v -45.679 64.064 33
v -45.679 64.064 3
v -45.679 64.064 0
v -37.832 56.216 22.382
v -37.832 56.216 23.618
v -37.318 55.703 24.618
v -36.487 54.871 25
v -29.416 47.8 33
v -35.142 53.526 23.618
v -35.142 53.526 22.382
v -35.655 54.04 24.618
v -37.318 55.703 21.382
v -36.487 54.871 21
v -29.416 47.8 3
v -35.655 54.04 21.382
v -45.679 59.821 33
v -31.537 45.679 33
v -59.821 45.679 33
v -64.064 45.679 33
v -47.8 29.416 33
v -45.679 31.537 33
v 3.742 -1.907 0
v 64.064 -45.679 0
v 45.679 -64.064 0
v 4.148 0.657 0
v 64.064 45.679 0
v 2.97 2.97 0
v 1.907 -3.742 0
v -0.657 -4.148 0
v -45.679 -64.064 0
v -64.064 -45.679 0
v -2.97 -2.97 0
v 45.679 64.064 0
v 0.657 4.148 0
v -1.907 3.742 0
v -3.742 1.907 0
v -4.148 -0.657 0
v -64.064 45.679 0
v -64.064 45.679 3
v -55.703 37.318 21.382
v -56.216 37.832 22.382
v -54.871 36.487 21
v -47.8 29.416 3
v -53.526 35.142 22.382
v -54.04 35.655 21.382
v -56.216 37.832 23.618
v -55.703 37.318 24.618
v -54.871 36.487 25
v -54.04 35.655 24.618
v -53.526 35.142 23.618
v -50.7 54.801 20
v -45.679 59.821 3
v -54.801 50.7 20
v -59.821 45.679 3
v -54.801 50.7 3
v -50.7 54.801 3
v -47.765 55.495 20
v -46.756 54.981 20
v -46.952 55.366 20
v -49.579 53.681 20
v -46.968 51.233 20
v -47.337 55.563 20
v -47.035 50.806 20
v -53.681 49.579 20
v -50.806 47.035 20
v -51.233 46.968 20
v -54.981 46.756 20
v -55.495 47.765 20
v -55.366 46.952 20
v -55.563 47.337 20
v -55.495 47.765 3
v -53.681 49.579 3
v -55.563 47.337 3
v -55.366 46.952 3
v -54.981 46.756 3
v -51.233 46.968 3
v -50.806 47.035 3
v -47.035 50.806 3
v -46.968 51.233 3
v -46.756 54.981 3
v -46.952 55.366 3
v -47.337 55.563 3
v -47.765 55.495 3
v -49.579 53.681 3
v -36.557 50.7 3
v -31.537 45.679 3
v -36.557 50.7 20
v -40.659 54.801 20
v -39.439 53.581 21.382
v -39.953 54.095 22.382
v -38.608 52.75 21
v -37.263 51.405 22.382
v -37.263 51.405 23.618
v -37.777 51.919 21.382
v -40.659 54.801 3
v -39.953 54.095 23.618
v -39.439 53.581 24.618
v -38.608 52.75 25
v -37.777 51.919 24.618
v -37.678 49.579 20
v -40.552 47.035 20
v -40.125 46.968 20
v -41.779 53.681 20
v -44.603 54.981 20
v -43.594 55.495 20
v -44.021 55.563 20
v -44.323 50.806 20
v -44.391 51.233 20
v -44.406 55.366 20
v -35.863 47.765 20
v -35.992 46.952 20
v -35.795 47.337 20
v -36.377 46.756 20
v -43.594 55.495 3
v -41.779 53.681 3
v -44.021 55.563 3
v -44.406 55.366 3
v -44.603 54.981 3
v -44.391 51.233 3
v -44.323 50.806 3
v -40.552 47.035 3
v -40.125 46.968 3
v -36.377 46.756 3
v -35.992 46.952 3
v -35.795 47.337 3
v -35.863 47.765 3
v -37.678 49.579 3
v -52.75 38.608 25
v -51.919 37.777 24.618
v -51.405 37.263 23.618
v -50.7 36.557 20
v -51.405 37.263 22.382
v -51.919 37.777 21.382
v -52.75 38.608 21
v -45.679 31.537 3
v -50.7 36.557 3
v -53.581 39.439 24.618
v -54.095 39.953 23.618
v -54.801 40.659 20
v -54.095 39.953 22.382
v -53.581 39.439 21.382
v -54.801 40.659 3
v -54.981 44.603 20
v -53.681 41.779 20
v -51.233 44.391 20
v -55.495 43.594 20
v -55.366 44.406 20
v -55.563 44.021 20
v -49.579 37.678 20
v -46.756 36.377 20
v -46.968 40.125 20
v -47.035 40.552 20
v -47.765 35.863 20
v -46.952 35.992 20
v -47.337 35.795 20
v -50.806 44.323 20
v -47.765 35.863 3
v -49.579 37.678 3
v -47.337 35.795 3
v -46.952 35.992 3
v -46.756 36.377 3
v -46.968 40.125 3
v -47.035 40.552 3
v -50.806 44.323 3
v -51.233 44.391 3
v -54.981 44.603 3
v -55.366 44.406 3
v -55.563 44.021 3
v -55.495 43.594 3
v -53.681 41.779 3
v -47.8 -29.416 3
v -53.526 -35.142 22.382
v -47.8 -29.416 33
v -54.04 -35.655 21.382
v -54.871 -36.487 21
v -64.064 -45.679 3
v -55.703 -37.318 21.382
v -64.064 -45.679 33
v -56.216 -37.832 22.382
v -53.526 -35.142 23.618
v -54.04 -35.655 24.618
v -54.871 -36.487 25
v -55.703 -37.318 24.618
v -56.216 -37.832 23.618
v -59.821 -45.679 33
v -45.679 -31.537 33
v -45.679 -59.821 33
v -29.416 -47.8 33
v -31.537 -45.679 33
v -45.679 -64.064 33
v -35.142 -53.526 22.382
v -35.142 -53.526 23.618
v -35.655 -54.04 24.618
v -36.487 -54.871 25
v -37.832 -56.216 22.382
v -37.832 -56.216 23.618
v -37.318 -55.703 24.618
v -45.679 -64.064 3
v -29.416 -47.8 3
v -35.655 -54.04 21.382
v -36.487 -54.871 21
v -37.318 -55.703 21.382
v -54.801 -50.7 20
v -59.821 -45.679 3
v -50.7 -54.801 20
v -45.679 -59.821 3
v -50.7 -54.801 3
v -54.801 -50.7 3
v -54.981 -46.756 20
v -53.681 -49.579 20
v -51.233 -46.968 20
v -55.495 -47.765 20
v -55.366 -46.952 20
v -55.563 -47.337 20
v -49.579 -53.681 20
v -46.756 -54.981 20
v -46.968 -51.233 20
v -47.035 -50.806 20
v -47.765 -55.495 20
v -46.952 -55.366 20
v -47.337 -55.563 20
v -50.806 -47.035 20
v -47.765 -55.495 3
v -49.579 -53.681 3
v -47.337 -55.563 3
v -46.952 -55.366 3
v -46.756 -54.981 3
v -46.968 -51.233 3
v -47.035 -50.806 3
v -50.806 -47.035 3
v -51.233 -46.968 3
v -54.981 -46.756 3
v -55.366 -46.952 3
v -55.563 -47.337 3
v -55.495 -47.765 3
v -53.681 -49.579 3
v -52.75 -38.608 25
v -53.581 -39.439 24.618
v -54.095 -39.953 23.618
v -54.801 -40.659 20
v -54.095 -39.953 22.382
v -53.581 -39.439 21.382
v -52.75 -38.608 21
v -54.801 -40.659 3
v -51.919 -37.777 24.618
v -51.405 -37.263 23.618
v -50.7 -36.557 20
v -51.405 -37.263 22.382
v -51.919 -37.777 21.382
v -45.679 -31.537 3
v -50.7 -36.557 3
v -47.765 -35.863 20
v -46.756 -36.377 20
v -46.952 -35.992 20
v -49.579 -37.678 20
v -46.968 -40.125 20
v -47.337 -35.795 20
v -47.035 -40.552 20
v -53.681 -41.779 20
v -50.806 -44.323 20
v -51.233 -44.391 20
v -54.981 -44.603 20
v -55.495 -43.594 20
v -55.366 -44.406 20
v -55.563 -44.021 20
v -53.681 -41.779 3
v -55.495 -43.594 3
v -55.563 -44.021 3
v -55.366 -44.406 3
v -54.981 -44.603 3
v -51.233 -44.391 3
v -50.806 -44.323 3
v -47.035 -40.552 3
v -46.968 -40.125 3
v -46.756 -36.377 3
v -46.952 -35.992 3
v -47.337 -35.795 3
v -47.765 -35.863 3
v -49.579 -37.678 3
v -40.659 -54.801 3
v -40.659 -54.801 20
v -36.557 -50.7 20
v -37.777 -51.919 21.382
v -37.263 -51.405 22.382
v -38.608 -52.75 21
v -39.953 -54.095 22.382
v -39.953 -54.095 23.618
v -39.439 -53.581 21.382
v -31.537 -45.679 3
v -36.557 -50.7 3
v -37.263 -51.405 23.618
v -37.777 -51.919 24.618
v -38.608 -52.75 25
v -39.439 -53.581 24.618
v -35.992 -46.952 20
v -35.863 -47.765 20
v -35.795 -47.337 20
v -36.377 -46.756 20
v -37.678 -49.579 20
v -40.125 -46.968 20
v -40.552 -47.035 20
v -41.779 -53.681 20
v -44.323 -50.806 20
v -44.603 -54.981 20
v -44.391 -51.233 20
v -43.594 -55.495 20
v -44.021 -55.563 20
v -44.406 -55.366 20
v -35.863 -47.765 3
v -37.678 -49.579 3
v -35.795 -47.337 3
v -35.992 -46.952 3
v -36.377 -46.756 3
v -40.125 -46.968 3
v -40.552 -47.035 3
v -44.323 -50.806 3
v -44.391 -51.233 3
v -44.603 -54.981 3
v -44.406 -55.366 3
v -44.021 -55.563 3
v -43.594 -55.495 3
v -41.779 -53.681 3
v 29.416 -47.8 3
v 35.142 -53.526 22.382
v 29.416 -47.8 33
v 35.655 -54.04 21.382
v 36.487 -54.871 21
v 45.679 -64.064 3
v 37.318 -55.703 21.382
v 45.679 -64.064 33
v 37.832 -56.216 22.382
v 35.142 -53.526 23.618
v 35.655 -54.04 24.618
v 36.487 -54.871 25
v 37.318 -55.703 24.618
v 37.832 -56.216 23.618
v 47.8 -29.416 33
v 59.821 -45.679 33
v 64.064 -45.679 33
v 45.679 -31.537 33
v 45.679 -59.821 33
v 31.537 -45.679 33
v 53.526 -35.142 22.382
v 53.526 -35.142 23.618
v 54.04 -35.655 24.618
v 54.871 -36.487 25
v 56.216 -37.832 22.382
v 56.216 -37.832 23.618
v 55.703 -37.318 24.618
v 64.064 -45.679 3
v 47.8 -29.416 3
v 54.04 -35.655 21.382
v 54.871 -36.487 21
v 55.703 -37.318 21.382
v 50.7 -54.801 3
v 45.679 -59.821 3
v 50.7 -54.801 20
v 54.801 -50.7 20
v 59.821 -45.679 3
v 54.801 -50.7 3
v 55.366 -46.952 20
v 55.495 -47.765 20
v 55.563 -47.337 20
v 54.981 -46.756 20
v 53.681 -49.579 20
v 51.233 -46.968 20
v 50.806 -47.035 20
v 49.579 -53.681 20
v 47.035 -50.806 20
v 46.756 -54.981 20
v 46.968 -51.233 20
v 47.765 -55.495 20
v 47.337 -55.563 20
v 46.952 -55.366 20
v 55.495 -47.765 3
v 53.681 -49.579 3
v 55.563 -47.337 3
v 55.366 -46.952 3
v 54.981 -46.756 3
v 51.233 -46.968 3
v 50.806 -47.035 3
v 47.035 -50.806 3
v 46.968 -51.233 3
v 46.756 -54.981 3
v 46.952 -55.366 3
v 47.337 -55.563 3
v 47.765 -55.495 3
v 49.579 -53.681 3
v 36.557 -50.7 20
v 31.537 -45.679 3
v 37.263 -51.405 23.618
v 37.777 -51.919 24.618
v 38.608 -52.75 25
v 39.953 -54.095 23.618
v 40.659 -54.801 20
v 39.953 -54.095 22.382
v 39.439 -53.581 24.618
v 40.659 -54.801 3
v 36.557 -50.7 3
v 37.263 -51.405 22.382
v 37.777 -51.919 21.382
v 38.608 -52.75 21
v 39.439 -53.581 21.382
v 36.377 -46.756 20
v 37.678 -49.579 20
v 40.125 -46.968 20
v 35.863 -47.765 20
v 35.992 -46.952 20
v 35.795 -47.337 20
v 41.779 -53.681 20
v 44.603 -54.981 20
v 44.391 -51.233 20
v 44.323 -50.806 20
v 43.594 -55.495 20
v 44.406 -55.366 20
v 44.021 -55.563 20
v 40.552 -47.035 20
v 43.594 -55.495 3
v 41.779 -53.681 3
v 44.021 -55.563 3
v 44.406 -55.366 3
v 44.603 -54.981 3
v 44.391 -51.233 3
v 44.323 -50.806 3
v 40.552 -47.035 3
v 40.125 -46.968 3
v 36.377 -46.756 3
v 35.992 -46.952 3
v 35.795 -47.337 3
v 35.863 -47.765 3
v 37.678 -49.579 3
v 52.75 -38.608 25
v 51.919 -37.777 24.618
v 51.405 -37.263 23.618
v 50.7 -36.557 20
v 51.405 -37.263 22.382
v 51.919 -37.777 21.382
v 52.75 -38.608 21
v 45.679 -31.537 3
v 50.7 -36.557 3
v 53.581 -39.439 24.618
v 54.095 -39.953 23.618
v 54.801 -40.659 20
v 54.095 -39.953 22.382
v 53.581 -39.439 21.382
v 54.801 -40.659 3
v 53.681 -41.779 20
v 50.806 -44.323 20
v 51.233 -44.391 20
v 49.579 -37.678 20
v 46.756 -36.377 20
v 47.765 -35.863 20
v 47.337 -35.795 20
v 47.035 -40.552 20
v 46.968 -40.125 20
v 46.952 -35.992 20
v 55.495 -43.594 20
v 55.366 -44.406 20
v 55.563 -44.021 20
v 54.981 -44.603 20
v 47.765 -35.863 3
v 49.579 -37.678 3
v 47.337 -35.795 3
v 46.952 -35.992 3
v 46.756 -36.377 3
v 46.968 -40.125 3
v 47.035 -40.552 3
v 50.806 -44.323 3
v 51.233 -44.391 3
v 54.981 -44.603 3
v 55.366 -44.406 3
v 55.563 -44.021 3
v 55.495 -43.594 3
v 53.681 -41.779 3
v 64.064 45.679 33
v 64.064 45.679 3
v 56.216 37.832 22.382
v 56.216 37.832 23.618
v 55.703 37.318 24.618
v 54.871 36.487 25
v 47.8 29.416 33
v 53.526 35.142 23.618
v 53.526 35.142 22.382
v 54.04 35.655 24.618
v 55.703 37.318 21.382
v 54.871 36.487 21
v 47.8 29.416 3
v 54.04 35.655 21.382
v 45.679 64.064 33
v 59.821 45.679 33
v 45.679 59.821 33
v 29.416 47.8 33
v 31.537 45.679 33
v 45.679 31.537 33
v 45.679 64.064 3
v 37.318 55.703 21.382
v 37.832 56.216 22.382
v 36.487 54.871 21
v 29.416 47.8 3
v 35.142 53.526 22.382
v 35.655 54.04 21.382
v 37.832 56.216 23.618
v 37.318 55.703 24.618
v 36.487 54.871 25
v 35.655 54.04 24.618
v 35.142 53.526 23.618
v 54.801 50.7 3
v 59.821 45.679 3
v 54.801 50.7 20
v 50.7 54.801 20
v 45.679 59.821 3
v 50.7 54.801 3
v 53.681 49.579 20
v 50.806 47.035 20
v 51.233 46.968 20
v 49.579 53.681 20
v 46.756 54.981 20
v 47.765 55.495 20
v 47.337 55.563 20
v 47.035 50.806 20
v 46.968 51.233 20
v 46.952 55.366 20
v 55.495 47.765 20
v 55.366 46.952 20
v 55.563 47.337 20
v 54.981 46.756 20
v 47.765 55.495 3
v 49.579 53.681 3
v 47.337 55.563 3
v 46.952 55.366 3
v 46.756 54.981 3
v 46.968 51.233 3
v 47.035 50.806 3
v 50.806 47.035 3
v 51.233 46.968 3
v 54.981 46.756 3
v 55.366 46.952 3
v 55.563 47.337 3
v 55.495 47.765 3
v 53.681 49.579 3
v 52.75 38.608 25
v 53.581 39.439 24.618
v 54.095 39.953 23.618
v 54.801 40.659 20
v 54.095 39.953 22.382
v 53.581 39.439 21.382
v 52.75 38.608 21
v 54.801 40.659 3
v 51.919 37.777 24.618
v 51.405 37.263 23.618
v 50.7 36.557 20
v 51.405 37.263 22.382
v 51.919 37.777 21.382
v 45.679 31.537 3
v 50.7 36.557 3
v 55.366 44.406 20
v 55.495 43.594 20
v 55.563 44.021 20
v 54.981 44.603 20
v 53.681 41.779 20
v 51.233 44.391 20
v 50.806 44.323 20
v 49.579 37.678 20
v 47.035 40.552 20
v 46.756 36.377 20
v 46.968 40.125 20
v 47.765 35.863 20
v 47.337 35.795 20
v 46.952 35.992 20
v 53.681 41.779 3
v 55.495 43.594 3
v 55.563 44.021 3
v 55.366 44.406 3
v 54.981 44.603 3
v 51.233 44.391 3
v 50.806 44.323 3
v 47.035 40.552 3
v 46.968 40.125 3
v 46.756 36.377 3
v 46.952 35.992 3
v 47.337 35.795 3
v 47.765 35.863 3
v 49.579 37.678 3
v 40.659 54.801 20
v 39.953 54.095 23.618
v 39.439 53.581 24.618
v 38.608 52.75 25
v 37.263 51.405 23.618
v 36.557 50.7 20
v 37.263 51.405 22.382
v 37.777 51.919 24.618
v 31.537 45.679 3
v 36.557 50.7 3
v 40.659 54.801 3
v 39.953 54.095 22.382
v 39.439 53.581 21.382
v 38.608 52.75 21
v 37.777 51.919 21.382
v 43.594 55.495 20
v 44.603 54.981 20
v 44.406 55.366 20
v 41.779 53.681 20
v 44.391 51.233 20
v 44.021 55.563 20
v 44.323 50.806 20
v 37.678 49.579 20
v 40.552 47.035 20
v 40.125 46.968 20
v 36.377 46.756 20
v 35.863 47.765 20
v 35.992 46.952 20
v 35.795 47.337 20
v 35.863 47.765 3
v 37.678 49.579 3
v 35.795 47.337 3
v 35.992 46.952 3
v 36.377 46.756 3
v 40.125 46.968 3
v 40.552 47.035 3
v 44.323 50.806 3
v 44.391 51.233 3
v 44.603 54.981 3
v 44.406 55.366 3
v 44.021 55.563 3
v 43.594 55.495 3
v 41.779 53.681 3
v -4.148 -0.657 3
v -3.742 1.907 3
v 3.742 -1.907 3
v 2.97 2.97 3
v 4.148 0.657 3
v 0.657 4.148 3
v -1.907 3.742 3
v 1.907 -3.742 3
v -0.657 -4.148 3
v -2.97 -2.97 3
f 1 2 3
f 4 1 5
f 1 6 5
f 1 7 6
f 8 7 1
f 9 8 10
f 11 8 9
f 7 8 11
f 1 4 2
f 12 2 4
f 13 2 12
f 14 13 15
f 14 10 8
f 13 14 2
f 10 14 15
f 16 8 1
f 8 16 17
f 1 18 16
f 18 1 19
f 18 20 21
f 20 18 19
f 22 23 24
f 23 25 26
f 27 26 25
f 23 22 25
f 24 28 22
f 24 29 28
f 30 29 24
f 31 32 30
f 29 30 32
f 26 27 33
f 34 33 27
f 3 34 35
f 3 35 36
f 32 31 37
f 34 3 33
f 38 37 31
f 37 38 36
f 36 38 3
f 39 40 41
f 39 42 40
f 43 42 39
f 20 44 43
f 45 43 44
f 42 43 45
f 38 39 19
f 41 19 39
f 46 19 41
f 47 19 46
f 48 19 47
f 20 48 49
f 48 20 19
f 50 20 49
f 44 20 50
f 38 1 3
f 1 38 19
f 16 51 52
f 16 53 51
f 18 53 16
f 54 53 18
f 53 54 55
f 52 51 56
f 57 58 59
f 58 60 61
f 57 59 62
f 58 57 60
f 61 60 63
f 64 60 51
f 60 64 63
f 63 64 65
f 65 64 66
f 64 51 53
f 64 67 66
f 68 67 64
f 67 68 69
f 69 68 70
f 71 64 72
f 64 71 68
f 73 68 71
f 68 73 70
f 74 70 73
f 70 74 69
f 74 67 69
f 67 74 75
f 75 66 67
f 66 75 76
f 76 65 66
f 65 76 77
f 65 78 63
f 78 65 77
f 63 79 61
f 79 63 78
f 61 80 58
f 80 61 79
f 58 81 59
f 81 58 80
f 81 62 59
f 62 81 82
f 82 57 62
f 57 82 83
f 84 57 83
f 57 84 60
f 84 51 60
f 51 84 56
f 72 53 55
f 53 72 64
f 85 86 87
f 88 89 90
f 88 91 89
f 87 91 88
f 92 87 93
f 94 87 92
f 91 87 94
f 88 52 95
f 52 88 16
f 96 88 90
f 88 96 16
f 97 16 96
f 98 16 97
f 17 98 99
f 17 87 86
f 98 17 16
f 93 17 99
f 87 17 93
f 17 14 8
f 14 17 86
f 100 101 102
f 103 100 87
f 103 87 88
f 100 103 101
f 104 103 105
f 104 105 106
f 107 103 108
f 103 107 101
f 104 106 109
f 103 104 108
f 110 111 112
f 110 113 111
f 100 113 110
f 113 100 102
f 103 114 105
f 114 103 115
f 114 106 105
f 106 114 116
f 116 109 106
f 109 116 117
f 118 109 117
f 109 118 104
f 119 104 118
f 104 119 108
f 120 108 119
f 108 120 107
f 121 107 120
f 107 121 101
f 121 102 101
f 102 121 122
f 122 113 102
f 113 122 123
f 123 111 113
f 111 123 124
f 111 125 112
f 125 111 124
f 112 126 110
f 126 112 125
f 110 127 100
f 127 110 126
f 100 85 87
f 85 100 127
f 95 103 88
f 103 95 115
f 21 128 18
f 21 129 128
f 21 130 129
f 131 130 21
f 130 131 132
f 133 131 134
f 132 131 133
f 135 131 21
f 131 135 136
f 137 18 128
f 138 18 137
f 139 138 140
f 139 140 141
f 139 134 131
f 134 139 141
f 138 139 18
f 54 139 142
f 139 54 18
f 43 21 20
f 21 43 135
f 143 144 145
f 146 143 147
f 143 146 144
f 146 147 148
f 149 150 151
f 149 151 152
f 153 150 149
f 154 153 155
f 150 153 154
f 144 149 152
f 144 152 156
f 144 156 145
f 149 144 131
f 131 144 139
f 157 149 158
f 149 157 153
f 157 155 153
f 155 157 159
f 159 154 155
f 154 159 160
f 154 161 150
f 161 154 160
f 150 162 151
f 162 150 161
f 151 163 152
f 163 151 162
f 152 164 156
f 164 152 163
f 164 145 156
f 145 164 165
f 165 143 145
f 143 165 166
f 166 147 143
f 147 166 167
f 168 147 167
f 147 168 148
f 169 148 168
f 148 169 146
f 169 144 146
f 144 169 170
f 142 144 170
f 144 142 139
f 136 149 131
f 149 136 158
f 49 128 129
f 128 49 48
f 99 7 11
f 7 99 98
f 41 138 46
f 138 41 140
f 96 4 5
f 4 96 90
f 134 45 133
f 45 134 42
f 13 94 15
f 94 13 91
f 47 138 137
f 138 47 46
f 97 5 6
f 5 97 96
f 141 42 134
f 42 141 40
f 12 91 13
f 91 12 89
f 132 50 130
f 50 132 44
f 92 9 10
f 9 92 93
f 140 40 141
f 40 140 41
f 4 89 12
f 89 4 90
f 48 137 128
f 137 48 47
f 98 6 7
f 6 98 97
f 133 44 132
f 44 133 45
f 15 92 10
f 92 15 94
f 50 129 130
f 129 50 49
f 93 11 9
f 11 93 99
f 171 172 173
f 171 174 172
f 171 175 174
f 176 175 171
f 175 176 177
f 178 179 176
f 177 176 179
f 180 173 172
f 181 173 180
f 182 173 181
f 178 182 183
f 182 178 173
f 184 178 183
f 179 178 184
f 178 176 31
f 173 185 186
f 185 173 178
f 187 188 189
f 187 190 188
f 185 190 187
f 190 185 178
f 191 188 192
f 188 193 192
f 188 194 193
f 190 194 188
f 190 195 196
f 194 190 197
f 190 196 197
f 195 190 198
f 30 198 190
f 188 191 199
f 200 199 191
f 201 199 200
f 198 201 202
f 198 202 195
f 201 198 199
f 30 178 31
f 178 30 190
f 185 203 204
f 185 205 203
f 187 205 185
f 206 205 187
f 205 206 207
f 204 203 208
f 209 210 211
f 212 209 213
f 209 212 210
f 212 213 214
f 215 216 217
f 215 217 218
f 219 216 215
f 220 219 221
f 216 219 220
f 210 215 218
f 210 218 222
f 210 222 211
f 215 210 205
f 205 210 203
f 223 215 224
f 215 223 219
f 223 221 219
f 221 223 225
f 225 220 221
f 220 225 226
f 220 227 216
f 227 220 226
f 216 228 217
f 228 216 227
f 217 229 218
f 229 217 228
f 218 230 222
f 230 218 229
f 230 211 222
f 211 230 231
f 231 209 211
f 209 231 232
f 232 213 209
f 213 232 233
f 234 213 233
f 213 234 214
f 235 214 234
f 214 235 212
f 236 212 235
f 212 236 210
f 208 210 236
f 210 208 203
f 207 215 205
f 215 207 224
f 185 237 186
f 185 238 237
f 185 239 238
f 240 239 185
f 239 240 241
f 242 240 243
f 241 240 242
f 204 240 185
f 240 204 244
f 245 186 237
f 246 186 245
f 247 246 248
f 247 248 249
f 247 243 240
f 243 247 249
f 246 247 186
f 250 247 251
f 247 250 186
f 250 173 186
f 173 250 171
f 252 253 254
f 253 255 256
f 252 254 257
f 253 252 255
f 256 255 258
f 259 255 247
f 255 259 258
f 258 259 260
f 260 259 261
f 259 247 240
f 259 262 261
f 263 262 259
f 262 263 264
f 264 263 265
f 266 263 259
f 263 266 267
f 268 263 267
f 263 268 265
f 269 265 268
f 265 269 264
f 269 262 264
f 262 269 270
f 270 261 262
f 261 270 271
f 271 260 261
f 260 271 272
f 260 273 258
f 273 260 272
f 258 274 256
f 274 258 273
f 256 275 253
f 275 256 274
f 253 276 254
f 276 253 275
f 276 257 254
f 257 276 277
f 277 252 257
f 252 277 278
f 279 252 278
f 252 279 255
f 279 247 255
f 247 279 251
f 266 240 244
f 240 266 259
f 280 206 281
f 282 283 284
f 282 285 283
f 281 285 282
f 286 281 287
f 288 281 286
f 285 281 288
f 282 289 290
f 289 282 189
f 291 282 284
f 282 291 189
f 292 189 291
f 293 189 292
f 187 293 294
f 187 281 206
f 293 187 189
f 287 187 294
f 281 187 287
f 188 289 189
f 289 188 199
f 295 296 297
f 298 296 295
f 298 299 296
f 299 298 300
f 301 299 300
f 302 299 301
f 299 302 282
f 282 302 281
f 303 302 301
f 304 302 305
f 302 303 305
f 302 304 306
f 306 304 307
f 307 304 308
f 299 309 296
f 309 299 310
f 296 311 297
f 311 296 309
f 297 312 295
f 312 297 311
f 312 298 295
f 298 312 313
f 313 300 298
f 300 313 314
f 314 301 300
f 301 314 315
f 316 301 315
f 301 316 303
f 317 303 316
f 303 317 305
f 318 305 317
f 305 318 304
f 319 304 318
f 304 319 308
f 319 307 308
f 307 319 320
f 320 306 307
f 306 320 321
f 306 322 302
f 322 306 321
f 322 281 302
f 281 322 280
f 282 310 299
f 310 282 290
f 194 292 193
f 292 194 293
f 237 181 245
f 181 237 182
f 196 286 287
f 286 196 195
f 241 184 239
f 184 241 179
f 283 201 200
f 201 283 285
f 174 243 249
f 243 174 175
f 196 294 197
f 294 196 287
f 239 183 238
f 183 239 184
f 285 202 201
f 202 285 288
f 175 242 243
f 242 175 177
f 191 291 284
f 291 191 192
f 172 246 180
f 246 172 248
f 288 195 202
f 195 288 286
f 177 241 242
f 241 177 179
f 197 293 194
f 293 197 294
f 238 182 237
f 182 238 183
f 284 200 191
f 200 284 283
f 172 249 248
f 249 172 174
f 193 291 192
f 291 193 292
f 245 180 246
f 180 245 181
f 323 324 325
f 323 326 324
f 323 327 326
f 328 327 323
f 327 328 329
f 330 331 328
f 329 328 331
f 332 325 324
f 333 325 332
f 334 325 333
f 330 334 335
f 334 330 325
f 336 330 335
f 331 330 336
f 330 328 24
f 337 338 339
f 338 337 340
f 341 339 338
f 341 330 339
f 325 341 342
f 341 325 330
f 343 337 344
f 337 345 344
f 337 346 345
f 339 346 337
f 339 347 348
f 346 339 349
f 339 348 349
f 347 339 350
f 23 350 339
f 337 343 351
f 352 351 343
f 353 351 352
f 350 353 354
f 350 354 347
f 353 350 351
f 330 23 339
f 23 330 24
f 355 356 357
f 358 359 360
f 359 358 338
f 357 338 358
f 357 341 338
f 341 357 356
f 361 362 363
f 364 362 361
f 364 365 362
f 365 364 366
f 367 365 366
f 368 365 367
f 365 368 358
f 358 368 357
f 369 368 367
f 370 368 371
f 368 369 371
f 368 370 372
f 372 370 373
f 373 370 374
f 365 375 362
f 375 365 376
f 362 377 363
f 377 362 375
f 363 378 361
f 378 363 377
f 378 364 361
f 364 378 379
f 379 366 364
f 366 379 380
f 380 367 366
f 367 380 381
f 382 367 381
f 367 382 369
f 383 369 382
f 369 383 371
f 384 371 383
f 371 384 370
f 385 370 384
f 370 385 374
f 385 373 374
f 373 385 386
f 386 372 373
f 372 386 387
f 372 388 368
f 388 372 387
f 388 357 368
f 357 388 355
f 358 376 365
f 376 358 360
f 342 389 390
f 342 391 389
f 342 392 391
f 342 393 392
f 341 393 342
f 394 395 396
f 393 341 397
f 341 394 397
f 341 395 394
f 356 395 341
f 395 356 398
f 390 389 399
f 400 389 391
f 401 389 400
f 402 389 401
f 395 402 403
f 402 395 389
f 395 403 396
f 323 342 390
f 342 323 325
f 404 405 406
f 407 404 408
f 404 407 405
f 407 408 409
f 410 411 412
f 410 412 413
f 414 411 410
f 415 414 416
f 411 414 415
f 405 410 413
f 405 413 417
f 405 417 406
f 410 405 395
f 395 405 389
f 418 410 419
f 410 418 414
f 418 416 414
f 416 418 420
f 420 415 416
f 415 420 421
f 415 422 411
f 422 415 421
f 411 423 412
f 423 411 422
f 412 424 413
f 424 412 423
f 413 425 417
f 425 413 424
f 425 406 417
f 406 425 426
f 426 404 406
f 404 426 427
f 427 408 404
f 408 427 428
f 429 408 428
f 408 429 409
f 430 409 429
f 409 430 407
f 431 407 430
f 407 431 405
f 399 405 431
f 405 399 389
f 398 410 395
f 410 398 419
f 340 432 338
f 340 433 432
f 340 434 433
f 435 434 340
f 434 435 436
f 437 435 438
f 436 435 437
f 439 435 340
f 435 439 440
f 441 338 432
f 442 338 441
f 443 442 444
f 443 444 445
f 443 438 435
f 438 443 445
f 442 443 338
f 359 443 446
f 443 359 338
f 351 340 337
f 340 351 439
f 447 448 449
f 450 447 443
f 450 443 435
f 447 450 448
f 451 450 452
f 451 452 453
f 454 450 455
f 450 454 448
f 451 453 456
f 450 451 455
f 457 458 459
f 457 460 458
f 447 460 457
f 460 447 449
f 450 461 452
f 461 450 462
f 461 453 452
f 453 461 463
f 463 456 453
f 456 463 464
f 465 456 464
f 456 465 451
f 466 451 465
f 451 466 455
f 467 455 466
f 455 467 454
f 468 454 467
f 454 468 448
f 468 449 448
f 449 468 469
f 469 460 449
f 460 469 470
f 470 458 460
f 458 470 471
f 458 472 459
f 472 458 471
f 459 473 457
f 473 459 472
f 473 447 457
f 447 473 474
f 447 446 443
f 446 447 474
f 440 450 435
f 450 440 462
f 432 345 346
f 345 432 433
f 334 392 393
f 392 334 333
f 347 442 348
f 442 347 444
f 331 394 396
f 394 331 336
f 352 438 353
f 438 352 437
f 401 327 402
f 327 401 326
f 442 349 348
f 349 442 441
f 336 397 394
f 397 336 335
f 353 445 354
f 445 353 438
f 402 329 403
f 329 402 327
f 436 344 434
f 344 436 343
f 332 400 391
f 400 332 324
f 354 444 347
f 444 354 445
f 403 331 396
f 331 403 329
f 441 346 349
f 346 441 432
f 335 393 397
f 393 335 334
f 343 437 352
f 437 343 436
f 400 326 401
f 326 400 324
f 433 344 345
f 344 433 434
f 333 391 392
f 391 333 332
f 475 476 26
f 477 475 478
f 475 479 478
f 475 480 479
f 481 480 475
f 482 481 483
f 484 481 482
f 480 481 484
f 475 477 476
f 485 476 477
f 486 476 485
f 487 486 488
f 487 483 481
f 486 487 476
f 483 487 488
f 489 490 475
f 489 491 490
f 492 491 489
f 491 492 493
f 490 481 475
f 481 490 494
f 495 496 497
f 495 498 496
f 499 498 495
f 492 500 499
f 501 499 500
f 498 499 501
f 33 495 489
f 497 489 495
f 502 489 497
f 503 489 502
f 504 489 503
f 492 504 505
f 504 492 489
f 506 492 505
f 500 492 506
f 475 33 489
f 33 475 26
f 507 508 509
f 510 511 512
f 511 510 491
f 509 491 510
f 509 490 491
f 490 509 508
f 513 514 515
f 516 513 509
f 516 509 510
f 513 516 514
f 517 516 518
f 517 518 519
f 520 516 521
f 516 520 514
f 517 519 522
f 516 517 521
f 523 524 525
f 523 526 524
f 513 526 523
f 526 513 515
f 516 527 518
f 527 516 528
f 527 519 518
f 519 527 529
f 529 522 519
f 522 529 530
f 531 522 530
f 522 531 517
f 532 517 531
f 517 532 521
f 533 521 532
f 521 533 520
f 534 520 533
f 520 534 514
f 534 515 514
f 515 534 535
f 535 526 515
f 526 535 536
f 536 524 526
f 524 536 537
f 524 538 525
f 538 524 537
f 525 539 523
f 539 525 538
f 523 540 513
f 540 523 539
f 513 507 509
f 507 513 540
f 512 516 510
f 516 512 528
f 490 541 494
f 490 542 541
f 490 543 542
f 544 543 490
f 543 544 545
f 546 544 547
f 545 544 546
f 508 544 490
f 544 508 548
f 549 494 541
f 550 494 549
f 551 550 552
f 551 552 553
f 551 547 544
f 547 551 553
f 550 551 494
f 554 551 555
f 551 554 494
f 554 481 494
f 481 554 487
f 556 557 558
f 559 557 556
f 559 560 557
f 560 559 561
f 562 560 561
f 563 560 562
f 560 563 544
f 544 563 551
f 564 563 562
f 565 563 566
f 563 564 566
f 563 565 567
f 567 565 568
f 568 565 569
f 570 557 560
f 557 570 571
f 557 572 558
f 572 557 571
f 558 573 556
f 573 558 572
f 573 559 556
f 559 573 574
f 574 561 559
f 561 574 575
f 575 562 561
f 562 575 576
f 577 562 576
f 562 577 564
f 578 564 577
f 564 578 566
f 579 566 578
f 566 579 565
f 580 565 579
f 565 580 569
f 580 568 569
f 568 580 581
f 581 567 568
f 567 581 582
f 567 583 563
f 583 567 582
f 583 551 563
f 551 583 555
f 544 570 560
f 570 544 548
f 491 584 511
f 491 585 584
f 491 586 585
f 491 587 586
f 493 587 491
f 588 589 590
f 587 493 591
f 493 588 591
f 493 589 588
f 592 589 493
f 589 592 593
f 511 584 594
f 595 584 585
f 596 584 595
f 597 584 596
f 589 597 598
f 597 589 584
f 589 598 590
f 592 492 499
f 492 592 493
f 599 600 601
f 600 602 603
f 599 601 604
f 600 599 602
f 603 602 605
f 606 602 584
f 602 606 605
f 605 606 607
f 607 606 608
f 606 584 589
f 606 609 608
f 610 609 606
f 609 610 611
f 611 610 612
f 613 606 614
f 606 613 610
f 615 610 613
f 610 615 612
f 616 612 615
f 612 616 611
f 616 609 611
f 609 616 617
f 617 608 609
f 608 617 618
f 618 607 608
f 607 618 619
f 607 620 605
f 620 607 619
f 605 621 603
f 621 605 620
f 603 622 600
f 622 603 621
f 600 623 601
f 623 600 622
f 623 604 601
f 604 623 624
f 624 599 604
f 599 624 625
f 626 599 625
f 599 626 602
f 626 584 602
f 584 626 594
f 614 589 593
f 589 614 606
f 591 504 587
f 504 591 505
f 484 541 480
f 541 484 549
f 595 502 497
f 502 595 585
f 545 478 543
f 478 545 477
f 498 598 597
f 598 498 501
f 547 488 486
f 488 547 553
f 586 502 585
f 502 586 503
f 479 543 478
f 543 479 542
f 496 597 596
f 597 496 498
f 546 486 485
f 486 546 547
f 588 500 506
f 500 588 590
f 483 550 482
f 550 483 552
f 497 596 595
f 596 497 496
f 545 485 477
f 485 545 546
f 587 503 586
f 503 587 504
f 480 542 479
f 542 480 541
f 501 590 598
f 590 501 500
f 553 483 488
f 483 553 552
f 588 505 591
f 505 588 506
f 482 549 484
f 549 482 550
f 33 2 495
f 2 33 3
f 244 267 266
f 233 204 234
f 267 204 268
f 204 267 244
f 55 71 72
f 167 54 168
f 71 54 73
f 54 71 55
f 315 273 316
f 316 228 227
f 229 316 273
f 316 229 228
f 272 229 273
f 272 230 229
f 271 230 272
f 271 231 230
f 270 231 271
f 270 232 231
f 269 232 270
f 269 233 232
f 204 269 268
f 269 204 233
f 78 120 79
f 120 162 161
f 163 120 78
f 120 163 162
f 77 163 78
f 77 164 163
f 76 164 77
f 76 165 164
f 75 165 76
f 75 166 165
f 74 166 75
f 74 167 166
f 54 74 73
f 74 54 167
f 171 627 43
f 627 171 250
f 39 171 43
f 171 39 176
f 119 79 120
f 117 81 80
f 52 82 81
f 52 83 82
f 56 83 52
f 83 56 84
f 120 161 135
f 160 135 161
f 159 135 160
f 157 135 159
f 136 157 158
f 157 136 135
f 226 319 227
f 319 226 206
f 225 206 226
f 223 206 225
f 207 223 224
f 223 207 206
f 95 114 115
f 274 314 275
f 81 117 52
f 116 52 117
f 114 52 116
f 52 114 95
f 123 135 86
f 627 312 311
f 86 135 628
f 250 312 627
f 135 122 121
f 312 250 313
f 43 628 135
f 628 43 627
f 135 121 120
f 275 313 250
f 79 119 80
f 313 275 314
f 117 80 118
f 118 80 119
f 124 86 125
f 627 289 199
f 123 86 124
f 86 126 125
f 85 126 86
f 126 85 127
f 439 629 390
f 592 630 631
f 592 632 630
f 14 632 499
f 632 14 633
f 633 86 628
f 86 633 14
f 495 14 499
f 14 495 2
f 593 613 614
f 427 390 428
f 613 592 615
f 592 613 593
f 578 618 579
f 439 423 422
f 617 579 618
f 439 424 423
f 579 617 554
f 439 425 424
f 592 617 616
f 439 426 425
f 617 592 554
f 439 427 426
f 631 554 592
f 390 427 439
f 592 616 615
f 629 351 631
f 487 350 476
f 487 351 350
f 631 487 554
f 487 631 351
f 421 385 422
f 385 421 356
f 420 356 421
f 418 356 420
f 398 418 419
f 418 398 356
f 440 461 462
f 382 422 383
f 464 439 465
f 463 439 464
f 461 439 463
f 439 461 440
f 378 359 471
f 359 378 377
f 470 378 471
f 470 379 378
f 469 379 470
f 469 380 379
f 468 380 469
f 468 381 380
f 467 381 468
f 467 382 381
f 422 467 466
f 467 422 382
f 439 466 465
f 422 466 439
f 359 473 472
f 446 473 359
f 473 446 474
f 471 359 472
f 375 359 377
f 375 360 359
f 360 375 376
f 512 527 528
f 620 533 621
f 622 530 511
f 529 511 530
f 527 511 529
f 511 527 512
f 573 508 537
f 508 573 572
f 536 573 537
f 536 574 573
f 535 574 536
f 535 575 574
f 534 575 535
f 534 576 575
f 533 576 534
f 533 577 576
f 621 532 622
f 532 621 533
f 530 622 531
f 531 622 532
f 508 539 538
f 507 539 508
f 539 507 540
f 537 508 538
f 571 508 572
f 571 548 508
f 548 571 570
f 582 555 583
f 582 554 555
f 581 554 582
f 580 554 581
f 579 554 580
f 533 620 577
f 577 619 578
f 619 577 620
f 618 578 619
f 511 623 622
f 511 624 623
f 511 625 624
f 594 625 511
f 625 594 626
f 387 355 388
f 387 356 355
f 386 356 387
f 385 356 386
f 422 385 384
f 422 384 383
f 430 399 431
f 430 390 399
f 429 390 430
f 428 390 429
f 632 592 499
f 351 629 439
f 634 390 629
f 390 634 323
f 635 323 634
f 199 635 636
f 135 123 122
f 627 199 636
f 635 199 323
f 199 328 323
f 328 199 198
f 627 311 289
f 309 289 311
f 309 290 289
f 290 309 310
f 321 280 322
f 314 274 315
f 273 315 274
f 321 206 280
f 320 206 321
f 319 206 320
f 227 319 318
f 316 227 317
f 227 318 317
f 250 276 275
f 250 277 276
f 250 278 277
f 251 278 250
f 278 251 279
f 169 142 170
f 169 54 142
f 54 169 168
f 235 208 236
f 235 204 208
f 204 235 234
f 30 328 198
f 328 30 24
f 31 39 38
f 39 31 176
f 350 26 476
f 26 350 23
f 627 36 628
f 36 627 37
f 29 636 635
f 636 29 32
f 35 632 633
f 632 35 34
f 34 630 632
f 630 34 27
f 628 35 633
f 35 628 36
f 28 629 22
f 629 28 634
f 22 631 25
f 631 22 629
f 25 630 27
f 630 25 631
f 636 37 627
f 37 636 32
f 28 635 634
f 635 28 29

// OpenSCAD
largeurSupport = 26;
taillePlatine = 155.2;
hauteurSupport = 33;
$fn = 10;

rotate(45) union() {
	for (i = [0 : 3]) {
		rotate([0, 0, i * 90]) {
			translate([0, 54.6,0]) support();
		}
	}
	difference() {
		platine();
		cylinder(h = 20, r = 4.2, center = true);
	}
}

module support() {
	difference() {
		union() {
			translate([-13, 20, 0]) cube([26, 3, hauteurSupport]);
			translate([0, 20, 0]) rotate(180) fleche();
			translate([10, 0, 0]) cube([3, 23, hauteurSupport]);
			translate([10, 10, 0]) rotate(90) fleche();
			translate([-13, 0, 0]) cube([3, 23, hauteurSupport]);
			translate([-10, 10, 0]) rotate(-90) fleche();
		}
	translate ([0, 10, 23 ]) rotate([0, 90, 0]) cylinder(h = 50, r = 2, center = true);
	}
}

module fleche() {
	linear_extrude(height = 20, center = false, convexity = 10, twist = 0)
	union() {
		translate([-2.9, 0, 0]) square([5.8, 5]);
		hull() {
			translate([5.25, 2.25, 0]) circle(0.7, true);
			translate([-5.25, 2.25, 0]) circle(0.7, true);
			translate([-2.45, 4.75, 0]) circle(0.7, true);
			translate([2.45, 4.75, 0]) circle(0.7, true);
		}
	}
}

module platine() {
	linear_extrude(height = 3, center = false, convexity = 10, twist = 0)
	polygon([	[-taillePlatine / 2, largeurSupport / 2], [-largeurSupport / 2, taillePlatine / 2],
				[largeurSupport / 2, taillePlatine / 2], [taillePlatine / 2, largeurSupport / 2],
				[taillePlatine / 2, -largeurSupport / 2], [largeurSupport / 2, -taillePlatine / 2],
				[-largeurSupport / 2, -taillePlatine / 2], [-taillePlatine / 2, -largeurSupport / 2]
	]);
}
